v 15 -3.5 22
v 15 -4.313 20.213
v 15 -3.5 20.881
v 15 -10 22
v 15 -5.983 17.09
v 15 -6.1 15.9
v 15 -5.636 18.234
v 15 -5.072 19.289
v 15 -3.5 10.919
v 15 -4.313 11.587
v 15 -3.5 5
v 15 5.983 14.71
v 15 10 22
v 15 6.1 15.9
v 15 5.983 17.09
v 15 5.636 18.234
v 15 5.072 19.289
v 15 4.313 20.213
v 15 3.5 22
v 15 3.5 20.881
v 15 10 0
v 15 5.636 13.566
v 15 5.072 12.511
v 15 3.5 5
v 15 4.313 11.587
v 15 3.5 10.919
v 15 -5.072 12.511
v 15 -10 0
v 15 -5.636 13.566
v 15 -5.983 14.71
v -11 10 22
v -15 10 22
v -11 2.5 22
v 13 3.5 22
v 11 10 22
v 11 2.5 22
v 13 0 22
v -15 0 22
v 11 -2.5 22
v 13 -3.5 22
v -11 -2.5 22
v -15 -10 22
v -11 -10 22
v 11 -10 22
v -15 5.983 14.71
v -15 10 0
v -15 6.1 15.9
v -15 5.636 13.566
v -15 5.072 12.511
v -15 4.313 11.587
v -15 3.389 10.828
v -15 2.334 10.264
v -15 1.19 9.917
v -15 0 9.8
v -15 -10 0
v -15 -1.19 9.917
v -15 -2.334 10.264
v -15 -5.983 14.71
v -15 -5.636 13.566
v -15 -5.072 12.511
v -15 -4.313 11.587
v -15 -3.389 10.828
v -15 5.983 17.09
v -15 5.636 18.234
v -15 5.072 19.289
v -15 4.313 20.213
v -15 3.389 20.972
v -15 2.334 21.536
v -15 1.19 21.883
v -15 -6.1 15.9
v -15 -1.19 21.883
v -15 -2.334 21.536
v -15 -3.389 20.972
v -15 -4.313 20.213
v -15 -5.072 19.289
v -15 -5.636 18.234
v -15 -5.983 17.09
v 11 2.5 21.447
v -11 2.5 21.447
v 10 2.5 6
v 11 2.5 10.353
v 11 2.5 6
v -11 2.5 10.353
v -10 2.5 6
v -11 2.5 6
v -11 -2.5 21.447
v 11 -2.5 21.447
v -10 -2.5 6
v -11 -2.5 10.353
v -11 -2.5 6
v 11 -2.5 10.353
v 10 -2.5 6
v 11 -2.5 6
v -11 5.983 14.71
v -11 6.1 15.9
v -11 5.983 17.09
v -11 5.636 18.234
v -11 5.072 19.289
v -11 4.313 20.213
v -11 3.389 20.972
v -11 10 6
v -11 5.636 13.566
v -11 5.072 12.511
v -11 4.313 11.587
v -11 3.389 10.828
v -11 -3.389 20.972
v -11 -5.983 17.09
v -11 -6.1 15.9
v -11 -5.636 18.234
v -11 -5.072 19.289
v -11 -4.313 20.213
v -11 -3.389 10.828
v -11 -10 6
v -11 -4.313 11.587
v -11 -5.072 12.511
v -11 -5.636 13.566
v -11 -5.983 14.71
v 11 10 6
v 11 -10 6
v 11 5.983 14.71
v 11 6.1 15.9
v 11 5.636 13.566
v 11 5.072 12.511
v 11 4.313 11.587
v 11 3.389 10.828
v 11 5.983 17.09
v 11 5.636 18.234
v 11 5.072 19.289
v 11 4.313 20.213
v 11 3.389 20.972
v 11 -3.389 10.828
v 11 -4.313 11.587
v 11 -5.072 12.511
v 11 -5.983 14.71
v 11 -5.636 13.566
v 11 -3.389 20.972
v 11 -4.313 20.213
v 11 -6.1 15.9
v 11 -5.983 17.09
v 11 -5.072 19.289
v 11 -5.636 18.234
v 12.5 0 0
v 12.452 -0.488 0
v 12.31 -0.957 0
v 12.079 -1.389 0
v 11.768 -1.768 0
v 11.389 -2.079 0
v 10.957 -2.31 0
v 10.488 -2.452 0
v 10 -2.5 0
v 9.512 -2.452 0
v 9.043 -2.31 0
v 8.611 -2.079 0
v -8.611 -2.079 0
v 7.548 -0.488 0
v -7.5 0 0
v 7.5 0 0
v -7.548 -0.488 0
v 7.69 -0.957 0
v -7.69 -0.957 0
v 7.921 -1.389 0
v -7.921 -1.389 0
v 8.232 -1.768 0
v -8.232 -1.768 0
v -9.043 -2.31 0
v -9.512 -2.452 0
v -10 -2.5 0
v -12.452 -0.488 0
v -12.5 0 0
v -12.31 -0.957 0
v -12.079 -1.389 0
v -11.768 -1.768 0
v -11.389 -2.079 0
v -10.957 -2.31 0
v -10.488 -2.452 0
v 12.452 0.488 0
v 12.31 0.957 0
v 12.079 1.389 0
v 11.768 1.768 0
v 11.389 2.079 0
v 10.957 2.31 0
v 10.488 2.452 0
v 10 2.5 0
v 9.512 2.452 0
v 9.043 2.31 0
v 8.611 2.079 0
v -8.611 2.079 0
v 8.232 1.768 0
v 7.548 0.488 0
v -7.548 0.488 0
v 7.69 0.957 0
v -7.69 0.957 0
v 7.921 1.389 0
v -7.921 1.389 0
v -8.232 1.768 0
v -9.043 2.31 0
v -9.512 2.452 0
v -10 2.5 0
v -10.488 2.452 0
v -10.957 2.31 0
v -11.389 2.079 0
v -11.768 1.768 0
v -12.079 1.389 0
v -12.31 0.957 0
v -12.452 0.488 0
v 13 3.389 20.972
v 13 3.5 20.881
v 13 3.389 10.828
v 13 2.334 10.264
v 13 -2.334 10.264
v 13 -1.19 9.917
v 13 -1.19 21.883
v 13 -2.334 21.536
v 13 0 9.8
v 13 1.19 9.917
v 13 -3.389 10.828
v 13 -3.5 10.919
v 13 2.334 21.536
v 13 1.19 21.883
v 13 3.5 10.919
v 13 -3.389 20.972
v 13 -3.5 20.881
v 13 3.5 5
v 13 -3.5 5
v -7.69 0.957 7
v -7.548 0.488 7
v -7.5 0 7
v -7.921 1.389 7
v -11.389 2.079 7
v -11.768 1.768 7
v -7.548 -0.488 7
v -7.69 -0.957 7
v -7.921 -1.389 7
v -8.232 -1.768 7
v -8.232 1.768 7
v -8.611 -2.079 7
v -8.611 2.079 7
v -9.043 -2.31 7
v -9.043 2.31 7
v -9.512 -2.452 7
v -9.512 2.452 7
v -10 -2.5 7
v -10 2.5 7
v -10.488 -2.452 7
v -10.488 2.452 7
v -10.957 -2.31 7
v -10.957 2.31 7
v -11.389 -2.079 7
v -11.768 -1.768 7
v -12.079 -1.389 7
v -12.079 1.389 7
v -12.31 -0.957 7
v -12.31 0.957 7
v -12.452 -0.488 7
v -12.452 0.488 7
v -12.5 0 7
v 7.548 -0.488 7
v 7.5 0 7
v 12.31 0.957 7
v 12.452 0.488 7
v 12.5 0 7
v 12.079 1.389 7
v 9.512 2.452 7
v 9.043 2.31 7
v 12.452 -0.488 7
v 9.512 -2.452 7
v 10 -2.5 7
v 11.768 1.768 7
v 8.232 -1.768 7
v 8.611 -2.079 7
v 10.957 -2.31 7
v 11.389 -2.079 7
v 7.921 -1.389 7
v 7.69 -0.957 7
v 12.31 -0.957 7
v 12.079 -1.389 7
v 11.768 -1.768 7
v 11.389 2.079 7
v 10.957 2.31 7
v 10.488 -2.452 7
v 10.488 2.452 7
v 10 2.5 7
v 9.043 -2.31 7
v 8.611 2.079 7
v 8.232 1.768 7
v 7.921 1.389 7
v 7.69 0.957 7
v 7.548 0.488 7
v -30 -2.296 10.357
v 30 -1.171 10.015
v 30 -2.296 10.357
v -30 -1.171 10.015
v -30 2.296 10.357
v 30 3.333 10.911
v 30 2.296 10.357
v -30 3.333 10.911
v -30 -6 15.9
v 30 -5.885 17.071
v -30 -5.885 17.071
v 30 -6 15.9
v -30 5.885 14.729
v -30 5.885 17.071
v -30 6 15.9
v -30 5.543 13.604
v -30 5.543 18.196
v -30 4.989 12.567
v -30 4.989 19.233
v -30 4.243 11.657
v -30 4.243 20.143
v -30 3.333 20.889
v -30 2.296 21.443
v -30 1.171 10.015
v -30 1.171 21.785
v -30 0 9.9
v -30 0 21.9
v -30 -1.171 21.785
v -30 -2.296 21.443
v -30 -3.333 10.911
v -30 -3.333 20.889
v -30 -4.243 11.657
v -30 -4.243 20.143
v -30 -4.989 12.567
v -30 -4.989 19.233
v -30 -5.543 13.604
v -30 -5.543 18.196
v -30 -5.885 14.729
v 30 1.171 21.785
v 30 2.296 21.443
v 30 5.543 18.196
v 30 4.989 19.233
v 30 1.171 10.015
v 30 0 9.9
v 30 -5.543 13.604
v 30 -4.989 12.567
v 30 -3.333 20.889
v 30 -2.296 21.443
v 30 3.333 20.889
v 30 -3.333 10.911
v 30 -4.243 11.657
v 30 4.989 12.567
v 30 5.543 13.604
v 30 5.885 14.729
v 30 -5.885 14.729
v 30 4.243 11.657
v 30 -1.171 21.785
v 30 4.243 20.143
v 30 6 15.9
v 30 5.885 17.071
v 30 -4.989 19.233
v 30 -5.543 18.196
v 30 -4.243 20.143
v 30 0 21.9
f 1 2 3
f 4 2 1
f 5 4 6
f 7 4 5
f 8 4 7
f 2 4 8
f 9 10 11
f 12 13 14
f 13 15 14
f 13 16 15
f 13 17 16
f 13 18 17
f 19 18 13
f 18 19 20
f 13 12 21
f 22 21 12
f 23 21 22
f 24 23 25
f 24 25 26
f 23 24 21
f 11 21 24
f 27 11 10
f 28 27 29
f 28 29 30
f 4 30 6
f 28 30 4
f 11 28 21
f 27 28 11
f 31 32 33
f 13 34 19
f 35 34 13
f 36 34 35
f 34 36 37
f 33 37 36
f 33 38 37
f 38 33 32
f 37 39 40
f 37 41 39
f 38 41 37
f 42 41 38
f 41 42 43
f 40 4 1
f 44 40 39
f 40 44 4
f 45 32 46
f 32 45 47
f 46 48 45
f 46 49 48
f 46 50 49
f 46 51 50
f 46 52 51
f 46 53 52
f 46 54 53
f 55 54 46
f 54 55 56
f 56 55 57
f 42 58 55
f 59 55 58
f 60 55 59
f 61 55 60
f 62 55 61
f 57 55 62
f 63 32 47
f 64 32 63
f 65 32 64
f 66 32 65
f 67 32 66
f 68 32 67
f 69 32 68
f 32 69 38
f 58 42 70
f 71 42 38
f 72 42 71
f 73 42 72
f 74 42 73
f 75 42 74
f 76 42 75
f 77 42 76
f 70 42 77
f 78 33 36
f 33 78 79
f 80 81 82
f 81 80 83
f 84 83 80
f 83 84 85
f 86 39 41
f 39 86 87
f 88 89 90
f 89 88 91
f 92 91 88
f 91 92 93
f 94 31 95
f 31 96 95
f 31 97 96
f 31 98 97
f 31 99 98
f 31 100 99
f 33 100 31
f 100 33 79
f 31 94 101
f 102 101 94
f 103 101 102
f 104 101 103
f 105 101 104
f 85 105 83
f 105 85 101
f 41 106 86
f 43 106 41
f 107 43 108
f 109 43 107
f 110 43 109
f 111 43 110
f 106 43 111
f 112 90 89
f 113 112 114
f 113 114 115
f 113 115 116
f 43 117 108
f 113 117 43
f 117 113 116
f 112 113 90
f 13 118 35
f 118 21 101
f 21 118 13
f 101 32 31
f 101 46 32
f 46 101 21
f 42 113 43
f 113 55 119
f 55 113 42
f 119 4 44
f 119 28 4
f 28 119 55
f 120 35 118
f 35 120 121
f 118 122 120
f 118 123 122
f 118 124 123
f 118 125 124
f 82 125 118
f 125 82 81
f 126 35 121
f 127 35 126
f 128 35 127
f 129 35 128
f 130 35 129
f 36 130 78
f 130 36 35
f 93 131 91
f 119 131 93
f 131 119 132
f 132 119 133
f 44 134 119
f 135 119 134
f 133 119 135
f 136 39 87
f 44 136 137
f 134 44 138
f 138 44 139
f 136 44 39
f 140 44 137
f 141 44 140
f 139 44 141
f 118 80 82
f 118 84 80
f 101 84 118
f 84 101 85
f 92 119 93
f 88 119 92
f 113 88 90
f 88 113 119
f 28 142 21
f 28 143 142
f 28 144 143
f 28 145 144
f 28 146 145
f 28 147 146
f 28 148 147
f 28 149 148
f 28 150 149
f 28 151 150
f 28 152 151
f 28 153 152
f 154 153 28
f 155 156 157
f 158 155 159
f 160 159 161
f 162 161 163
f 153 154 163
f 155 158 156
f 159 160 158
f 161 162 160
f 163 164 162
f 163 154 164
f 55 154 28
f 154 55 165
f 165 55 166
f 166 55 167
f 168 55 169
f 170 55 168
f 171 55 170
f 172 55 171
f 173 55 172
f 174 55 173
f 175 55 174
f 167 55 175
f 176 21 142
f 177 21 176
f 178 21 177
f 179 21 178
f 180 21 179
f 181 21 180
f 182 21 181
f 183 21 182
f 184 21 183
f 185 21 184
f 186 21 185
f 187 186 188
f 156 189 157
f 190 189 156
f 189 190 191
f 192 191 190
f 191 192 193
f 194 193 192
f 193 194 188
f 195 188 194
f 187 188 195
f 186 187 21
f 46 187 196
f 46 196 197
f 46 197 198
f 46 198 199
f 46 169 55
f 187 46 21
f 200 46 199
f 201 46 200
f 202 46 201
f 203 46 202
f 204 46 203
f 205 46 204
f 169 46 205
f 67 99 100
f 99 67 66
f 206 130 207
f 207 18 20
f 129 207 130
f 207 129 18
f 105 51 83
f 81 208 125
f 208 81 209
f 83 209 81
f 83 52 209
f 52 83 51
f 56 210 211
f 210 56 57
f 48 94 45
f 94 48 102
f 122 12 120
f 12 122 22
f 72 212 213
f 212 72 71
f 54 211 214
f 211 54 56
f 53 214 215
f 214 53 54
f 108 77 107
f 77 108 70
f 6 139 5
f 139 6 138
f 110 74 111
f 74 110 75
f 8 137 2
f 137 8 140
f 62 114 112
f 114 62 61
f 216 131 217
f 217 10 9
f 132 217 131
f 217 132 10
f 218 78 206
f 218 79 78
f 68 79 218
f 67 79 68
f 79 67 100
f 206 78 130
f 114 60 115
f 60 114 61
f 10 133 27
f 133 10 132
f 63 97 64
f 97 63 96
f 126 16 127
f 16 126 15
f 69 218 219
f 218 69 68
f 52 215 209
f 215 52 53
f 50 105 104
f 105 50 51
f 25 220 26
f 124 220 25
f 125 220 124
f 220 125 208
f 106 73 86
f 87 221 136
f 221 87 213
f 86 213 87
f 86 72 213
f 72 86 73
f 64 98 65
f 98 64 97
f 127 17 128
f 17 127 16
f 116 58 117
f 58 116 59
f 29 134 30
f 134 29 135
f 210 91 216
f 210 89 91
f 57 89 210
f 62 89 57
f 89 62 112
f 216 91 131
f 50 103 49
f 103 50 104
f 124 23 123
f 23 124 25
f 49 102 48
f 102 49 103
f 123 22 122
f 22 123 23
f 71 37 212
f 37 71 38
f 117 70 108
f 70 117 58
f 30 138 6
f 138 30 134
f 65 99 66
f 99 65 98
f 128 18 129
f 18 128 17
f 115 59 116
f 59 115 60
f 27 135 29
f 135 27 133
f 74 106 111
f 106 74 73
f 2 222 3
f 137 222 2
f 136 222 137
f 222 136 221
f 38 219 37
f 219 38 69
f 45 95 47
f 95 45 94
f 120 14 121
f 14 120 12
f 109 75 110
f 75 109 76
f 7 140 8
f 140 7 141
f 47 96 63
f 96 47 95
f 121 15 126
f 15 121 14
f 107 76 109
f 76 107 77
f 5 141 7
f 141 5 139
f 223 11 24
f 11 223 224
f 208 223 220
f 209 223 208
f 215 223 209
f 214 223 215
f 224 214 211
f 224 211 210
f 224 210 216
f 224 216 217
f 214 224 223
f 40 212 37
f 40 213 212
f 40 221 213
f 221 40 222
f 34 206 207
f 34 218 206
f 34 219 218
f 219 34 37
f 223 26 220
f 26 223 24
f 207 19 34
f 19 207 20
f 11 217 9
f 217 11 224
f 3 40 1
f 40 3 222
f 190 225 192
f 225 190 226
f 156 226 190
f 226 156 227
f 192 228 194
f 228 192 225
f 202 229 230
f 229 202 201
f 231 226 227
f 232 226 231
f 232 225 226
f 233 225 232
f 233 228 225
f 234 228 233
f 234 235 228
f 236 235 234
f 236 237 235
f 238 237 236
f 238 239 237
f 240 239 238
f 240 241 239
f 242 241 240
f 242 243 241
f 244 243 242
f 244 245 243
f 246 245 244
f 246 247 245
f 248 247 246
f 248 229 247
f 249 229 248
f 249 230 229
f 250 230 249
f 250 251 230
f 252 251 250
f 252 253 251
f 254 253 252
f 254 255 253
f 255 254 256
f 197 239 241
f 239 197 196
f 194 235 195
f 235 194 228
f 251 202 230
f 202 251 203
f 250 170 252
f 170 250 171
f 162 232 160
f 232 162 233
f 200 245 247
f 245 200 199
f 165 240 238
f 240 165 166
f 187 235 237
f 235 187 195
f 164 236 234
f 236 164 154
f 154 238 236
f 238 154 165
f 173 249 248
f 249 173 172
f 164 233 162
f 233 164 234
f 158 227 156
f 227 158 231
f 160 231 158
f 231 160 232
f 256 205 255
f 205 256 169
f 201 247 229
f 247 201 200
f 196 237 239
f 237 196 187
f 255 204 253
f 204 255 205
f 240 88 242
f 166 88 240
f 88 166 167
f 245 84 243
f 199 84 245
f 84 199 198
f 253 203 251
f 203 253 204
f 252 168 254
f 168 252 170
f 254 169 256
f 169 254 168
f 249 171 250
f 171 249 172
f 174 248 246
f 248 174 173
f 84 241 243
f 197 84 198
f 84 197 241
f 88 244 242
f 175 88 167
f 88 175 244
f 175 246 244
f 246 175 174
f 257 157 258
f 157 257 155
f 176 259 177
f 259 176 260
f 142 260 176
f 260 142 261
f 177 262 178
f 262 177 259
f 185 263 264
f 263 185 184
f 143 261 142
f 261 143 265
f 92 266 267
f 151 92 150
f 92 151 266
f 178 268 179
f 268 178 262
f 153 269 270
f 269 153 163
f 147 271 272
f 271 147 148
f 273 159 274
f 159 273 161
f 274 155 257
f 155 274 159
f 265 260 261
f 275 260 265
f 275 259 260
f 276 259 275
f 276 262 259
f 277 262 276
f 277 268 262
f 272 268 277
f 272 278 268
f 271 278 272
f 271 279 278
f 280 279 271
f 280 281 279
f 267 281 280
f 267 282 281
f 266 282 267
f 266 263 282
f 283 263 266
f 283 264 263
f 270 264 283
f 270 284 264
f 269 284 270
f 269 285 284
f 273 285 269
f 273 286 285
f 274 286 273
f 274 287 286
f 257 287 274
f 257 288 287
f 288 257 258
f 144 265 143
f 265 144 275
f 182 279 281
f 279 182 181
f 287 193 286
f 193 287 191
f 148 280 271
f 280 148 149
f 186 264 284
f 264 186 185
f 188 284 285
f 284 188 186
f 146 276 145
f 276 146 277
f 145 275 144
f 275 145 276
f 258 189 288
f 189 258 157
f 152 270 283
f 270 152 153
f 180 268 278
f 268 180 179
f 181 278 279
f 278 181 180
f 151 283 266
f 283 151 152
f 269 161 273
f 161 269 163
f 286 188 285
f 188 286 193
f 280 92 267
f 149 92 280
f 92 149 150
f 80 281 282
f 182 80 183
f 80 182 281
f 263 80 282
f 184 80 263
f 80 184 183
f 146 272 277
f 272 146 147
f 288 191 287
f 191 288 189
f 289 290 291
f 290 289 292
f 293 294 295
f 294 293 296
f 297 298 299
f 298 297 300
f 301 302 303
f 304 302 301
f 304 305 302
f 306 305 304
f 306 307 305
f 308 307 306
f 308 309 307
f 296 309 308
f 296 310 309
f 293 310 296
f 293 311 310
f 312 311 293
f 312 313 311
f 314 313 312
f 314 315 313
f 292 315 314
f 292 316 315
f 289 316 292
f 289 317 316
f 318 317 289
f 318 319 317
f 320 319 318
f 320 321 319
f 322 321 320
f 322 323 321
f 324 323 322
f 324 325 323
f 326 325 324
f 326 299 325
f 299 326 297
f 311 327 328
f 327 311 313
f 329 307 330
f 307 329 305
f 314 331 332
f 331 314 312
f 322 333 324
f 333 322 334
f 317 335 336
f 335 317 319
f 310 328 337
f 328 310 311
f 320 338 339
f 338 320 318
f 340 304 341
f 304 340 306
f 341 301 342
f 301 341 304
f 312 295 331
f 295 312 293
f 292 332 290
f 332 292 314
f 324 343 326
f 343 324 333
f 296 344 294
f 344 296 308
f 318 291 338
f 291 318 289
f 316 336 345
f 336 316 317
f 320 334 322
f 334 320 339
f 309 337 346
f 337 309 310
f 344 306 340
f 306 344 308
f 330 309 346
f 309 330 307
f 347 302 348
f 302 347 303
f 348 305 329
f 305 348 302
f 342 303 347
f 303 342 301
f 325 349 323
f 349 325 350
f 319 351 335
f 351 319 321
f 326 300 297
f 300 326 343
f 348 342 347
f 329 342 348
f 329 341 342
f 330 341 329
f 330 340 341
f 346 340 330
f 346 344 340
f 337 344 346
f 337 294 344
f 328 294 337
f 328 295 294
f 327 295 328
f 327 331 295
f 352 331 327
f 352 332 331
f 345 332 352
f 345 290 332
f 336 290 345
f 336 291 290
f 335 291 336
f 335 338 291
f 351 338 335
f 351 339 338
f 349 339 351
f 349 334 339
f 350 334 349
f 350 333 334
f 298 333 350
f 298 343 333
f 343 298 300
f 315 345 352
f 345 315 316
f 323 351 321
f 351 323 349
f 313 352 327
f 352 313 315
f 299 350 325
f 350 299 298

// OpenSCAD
// Parameters
rod_diameter_mm = 12.0; //[6.0:24.0:0.1]
rod_length_mm = 60.0; //[30.0:120.0:1]
overall_height_mm = 23.0; //[12.0:46.0:0.1]
bore_clearance_mm = 0.2; //[0.0:0.6:0.05]
bracket_width_mm = 30.0; //[15.0:60.0:0.5]
bracket_depth_mm = 20.0; //[10.0:40.0:0.5]
base_thickness_mm = 6.0; //[3.0:12.0:0.5]
side_wall_thickness_mm = 5.0; //[2.5:10.0:0.5]
mount_hole_diameter_mm = 5.0; //[3.0:8.0:0.1]
mount_hole_spacing_mm = 20.0; //[10.0:40.0:0.5]
clamp_split_width_mm = 2.0; //[0.8:4.0:0.1]
fillet_radius_mm = 2.0; //[0.5:5.0:0.5]
overlap_mm = 1.0; //[0.5:2.0:0.1]

// Rod - complete geometry
module rod() {
  color("Silver") {
    cylinder(r=rod_diameter_mm/2, h=rod_length_mm, center=true, $fn=32);
  }
}

// Bracket - complete geometry
module bracket() {
  color("Silver") {
    difference() {
      union() {
        // Base foot
        translate([0, 0, base_thickness_mm/2])
          cube([bracket_width_mm, bracket_depth_mm, base_thickness_mm], center=true);
        
        // Bracket body with gussets
        union() {
          // Bracket body block
          translate([0, 0, base_thickness_mm + (overall_height_mm - base_thickness_mm)/2 - overlap_mm])
            cube([bracket_width_mm, side_wall_thickness_mm, overall_height_mm - base_thickness_mm], center=true);
          
          // Gusset left
          translate([-bracket_width_mm/2 + fillet_radius_mm, 0, base_thickness_mm + (overall_height_mm - base_thickness_mm)/2 - overlap_mm])
            cube([fillet_radius_mm*2, bracket_depth_mm, overall_height_mm - base_thickness_mm], center=true);
          
          // Gusset right
          translate([bracket_width_mm/2 - fillet_radius_mm, 0, base_thickness_mm + (overall_height_mm - base_thickness_mm)/2 - overlap_mm])
            cube([fillet_radius_mm*2, bracket_depth_mm, overall_height_mm - base_thickness_mm], center=true);
        }
      }
      
      // Rod bore
      translate([0, 0, base_thickness_mm + (overall_height_mm - base_thickness_mm) - (rod_diameter_mm + bore_clearance_mm)/2 - overlap_mm])
        rotate([0, 90, 0])
        cylinder(r=(rod_diameter_mm + bore_clearance_mm)/2, h=bracket_width_mm + 2*overlap_mm, center=true, $fn=32);
      
      // Clamp split slot
      translate([bracket_width_mm/2 - clamp_split_width_mm/2, 0, base_thickness_mm + (overall_height_mm - base_thickness_mm)/2])
        cube([clamp_split_width_mm, side_wall_thickness_mm + 2*overlap_mm, (overall_height_mm - base_thickness_mm) + 2*overlap_mm], center=true);
      
      // Mounting holes
      translate([-mount_hole_spacing_mm/2, 0, base_thickness_mm/2])
        cylinder(r=mount_hole_diameter_mm/2, h=base_thickness_mm + 2*overlap_mm, center=true, $fn=32);
      translate([mount_hole_spacing_mm/2, 0, base_thickness_mm/2])
        cylinder(r=mount_hole_diameter_mm/2, h=base_thickness_mm + 2*overlap_mm, center=true, $fn=32);
    }
  }
}

// Assembly
module assembly() {
  bracket();
  translate([0, 0, base_thickness_mm + (overall_height_mm - base_thickness_mm) - (rod_diameter_mm + bore_clearance_mm)/2 - overlap_mm])
    rotate([0, 90, 0])
    rod();
}

assembly();
